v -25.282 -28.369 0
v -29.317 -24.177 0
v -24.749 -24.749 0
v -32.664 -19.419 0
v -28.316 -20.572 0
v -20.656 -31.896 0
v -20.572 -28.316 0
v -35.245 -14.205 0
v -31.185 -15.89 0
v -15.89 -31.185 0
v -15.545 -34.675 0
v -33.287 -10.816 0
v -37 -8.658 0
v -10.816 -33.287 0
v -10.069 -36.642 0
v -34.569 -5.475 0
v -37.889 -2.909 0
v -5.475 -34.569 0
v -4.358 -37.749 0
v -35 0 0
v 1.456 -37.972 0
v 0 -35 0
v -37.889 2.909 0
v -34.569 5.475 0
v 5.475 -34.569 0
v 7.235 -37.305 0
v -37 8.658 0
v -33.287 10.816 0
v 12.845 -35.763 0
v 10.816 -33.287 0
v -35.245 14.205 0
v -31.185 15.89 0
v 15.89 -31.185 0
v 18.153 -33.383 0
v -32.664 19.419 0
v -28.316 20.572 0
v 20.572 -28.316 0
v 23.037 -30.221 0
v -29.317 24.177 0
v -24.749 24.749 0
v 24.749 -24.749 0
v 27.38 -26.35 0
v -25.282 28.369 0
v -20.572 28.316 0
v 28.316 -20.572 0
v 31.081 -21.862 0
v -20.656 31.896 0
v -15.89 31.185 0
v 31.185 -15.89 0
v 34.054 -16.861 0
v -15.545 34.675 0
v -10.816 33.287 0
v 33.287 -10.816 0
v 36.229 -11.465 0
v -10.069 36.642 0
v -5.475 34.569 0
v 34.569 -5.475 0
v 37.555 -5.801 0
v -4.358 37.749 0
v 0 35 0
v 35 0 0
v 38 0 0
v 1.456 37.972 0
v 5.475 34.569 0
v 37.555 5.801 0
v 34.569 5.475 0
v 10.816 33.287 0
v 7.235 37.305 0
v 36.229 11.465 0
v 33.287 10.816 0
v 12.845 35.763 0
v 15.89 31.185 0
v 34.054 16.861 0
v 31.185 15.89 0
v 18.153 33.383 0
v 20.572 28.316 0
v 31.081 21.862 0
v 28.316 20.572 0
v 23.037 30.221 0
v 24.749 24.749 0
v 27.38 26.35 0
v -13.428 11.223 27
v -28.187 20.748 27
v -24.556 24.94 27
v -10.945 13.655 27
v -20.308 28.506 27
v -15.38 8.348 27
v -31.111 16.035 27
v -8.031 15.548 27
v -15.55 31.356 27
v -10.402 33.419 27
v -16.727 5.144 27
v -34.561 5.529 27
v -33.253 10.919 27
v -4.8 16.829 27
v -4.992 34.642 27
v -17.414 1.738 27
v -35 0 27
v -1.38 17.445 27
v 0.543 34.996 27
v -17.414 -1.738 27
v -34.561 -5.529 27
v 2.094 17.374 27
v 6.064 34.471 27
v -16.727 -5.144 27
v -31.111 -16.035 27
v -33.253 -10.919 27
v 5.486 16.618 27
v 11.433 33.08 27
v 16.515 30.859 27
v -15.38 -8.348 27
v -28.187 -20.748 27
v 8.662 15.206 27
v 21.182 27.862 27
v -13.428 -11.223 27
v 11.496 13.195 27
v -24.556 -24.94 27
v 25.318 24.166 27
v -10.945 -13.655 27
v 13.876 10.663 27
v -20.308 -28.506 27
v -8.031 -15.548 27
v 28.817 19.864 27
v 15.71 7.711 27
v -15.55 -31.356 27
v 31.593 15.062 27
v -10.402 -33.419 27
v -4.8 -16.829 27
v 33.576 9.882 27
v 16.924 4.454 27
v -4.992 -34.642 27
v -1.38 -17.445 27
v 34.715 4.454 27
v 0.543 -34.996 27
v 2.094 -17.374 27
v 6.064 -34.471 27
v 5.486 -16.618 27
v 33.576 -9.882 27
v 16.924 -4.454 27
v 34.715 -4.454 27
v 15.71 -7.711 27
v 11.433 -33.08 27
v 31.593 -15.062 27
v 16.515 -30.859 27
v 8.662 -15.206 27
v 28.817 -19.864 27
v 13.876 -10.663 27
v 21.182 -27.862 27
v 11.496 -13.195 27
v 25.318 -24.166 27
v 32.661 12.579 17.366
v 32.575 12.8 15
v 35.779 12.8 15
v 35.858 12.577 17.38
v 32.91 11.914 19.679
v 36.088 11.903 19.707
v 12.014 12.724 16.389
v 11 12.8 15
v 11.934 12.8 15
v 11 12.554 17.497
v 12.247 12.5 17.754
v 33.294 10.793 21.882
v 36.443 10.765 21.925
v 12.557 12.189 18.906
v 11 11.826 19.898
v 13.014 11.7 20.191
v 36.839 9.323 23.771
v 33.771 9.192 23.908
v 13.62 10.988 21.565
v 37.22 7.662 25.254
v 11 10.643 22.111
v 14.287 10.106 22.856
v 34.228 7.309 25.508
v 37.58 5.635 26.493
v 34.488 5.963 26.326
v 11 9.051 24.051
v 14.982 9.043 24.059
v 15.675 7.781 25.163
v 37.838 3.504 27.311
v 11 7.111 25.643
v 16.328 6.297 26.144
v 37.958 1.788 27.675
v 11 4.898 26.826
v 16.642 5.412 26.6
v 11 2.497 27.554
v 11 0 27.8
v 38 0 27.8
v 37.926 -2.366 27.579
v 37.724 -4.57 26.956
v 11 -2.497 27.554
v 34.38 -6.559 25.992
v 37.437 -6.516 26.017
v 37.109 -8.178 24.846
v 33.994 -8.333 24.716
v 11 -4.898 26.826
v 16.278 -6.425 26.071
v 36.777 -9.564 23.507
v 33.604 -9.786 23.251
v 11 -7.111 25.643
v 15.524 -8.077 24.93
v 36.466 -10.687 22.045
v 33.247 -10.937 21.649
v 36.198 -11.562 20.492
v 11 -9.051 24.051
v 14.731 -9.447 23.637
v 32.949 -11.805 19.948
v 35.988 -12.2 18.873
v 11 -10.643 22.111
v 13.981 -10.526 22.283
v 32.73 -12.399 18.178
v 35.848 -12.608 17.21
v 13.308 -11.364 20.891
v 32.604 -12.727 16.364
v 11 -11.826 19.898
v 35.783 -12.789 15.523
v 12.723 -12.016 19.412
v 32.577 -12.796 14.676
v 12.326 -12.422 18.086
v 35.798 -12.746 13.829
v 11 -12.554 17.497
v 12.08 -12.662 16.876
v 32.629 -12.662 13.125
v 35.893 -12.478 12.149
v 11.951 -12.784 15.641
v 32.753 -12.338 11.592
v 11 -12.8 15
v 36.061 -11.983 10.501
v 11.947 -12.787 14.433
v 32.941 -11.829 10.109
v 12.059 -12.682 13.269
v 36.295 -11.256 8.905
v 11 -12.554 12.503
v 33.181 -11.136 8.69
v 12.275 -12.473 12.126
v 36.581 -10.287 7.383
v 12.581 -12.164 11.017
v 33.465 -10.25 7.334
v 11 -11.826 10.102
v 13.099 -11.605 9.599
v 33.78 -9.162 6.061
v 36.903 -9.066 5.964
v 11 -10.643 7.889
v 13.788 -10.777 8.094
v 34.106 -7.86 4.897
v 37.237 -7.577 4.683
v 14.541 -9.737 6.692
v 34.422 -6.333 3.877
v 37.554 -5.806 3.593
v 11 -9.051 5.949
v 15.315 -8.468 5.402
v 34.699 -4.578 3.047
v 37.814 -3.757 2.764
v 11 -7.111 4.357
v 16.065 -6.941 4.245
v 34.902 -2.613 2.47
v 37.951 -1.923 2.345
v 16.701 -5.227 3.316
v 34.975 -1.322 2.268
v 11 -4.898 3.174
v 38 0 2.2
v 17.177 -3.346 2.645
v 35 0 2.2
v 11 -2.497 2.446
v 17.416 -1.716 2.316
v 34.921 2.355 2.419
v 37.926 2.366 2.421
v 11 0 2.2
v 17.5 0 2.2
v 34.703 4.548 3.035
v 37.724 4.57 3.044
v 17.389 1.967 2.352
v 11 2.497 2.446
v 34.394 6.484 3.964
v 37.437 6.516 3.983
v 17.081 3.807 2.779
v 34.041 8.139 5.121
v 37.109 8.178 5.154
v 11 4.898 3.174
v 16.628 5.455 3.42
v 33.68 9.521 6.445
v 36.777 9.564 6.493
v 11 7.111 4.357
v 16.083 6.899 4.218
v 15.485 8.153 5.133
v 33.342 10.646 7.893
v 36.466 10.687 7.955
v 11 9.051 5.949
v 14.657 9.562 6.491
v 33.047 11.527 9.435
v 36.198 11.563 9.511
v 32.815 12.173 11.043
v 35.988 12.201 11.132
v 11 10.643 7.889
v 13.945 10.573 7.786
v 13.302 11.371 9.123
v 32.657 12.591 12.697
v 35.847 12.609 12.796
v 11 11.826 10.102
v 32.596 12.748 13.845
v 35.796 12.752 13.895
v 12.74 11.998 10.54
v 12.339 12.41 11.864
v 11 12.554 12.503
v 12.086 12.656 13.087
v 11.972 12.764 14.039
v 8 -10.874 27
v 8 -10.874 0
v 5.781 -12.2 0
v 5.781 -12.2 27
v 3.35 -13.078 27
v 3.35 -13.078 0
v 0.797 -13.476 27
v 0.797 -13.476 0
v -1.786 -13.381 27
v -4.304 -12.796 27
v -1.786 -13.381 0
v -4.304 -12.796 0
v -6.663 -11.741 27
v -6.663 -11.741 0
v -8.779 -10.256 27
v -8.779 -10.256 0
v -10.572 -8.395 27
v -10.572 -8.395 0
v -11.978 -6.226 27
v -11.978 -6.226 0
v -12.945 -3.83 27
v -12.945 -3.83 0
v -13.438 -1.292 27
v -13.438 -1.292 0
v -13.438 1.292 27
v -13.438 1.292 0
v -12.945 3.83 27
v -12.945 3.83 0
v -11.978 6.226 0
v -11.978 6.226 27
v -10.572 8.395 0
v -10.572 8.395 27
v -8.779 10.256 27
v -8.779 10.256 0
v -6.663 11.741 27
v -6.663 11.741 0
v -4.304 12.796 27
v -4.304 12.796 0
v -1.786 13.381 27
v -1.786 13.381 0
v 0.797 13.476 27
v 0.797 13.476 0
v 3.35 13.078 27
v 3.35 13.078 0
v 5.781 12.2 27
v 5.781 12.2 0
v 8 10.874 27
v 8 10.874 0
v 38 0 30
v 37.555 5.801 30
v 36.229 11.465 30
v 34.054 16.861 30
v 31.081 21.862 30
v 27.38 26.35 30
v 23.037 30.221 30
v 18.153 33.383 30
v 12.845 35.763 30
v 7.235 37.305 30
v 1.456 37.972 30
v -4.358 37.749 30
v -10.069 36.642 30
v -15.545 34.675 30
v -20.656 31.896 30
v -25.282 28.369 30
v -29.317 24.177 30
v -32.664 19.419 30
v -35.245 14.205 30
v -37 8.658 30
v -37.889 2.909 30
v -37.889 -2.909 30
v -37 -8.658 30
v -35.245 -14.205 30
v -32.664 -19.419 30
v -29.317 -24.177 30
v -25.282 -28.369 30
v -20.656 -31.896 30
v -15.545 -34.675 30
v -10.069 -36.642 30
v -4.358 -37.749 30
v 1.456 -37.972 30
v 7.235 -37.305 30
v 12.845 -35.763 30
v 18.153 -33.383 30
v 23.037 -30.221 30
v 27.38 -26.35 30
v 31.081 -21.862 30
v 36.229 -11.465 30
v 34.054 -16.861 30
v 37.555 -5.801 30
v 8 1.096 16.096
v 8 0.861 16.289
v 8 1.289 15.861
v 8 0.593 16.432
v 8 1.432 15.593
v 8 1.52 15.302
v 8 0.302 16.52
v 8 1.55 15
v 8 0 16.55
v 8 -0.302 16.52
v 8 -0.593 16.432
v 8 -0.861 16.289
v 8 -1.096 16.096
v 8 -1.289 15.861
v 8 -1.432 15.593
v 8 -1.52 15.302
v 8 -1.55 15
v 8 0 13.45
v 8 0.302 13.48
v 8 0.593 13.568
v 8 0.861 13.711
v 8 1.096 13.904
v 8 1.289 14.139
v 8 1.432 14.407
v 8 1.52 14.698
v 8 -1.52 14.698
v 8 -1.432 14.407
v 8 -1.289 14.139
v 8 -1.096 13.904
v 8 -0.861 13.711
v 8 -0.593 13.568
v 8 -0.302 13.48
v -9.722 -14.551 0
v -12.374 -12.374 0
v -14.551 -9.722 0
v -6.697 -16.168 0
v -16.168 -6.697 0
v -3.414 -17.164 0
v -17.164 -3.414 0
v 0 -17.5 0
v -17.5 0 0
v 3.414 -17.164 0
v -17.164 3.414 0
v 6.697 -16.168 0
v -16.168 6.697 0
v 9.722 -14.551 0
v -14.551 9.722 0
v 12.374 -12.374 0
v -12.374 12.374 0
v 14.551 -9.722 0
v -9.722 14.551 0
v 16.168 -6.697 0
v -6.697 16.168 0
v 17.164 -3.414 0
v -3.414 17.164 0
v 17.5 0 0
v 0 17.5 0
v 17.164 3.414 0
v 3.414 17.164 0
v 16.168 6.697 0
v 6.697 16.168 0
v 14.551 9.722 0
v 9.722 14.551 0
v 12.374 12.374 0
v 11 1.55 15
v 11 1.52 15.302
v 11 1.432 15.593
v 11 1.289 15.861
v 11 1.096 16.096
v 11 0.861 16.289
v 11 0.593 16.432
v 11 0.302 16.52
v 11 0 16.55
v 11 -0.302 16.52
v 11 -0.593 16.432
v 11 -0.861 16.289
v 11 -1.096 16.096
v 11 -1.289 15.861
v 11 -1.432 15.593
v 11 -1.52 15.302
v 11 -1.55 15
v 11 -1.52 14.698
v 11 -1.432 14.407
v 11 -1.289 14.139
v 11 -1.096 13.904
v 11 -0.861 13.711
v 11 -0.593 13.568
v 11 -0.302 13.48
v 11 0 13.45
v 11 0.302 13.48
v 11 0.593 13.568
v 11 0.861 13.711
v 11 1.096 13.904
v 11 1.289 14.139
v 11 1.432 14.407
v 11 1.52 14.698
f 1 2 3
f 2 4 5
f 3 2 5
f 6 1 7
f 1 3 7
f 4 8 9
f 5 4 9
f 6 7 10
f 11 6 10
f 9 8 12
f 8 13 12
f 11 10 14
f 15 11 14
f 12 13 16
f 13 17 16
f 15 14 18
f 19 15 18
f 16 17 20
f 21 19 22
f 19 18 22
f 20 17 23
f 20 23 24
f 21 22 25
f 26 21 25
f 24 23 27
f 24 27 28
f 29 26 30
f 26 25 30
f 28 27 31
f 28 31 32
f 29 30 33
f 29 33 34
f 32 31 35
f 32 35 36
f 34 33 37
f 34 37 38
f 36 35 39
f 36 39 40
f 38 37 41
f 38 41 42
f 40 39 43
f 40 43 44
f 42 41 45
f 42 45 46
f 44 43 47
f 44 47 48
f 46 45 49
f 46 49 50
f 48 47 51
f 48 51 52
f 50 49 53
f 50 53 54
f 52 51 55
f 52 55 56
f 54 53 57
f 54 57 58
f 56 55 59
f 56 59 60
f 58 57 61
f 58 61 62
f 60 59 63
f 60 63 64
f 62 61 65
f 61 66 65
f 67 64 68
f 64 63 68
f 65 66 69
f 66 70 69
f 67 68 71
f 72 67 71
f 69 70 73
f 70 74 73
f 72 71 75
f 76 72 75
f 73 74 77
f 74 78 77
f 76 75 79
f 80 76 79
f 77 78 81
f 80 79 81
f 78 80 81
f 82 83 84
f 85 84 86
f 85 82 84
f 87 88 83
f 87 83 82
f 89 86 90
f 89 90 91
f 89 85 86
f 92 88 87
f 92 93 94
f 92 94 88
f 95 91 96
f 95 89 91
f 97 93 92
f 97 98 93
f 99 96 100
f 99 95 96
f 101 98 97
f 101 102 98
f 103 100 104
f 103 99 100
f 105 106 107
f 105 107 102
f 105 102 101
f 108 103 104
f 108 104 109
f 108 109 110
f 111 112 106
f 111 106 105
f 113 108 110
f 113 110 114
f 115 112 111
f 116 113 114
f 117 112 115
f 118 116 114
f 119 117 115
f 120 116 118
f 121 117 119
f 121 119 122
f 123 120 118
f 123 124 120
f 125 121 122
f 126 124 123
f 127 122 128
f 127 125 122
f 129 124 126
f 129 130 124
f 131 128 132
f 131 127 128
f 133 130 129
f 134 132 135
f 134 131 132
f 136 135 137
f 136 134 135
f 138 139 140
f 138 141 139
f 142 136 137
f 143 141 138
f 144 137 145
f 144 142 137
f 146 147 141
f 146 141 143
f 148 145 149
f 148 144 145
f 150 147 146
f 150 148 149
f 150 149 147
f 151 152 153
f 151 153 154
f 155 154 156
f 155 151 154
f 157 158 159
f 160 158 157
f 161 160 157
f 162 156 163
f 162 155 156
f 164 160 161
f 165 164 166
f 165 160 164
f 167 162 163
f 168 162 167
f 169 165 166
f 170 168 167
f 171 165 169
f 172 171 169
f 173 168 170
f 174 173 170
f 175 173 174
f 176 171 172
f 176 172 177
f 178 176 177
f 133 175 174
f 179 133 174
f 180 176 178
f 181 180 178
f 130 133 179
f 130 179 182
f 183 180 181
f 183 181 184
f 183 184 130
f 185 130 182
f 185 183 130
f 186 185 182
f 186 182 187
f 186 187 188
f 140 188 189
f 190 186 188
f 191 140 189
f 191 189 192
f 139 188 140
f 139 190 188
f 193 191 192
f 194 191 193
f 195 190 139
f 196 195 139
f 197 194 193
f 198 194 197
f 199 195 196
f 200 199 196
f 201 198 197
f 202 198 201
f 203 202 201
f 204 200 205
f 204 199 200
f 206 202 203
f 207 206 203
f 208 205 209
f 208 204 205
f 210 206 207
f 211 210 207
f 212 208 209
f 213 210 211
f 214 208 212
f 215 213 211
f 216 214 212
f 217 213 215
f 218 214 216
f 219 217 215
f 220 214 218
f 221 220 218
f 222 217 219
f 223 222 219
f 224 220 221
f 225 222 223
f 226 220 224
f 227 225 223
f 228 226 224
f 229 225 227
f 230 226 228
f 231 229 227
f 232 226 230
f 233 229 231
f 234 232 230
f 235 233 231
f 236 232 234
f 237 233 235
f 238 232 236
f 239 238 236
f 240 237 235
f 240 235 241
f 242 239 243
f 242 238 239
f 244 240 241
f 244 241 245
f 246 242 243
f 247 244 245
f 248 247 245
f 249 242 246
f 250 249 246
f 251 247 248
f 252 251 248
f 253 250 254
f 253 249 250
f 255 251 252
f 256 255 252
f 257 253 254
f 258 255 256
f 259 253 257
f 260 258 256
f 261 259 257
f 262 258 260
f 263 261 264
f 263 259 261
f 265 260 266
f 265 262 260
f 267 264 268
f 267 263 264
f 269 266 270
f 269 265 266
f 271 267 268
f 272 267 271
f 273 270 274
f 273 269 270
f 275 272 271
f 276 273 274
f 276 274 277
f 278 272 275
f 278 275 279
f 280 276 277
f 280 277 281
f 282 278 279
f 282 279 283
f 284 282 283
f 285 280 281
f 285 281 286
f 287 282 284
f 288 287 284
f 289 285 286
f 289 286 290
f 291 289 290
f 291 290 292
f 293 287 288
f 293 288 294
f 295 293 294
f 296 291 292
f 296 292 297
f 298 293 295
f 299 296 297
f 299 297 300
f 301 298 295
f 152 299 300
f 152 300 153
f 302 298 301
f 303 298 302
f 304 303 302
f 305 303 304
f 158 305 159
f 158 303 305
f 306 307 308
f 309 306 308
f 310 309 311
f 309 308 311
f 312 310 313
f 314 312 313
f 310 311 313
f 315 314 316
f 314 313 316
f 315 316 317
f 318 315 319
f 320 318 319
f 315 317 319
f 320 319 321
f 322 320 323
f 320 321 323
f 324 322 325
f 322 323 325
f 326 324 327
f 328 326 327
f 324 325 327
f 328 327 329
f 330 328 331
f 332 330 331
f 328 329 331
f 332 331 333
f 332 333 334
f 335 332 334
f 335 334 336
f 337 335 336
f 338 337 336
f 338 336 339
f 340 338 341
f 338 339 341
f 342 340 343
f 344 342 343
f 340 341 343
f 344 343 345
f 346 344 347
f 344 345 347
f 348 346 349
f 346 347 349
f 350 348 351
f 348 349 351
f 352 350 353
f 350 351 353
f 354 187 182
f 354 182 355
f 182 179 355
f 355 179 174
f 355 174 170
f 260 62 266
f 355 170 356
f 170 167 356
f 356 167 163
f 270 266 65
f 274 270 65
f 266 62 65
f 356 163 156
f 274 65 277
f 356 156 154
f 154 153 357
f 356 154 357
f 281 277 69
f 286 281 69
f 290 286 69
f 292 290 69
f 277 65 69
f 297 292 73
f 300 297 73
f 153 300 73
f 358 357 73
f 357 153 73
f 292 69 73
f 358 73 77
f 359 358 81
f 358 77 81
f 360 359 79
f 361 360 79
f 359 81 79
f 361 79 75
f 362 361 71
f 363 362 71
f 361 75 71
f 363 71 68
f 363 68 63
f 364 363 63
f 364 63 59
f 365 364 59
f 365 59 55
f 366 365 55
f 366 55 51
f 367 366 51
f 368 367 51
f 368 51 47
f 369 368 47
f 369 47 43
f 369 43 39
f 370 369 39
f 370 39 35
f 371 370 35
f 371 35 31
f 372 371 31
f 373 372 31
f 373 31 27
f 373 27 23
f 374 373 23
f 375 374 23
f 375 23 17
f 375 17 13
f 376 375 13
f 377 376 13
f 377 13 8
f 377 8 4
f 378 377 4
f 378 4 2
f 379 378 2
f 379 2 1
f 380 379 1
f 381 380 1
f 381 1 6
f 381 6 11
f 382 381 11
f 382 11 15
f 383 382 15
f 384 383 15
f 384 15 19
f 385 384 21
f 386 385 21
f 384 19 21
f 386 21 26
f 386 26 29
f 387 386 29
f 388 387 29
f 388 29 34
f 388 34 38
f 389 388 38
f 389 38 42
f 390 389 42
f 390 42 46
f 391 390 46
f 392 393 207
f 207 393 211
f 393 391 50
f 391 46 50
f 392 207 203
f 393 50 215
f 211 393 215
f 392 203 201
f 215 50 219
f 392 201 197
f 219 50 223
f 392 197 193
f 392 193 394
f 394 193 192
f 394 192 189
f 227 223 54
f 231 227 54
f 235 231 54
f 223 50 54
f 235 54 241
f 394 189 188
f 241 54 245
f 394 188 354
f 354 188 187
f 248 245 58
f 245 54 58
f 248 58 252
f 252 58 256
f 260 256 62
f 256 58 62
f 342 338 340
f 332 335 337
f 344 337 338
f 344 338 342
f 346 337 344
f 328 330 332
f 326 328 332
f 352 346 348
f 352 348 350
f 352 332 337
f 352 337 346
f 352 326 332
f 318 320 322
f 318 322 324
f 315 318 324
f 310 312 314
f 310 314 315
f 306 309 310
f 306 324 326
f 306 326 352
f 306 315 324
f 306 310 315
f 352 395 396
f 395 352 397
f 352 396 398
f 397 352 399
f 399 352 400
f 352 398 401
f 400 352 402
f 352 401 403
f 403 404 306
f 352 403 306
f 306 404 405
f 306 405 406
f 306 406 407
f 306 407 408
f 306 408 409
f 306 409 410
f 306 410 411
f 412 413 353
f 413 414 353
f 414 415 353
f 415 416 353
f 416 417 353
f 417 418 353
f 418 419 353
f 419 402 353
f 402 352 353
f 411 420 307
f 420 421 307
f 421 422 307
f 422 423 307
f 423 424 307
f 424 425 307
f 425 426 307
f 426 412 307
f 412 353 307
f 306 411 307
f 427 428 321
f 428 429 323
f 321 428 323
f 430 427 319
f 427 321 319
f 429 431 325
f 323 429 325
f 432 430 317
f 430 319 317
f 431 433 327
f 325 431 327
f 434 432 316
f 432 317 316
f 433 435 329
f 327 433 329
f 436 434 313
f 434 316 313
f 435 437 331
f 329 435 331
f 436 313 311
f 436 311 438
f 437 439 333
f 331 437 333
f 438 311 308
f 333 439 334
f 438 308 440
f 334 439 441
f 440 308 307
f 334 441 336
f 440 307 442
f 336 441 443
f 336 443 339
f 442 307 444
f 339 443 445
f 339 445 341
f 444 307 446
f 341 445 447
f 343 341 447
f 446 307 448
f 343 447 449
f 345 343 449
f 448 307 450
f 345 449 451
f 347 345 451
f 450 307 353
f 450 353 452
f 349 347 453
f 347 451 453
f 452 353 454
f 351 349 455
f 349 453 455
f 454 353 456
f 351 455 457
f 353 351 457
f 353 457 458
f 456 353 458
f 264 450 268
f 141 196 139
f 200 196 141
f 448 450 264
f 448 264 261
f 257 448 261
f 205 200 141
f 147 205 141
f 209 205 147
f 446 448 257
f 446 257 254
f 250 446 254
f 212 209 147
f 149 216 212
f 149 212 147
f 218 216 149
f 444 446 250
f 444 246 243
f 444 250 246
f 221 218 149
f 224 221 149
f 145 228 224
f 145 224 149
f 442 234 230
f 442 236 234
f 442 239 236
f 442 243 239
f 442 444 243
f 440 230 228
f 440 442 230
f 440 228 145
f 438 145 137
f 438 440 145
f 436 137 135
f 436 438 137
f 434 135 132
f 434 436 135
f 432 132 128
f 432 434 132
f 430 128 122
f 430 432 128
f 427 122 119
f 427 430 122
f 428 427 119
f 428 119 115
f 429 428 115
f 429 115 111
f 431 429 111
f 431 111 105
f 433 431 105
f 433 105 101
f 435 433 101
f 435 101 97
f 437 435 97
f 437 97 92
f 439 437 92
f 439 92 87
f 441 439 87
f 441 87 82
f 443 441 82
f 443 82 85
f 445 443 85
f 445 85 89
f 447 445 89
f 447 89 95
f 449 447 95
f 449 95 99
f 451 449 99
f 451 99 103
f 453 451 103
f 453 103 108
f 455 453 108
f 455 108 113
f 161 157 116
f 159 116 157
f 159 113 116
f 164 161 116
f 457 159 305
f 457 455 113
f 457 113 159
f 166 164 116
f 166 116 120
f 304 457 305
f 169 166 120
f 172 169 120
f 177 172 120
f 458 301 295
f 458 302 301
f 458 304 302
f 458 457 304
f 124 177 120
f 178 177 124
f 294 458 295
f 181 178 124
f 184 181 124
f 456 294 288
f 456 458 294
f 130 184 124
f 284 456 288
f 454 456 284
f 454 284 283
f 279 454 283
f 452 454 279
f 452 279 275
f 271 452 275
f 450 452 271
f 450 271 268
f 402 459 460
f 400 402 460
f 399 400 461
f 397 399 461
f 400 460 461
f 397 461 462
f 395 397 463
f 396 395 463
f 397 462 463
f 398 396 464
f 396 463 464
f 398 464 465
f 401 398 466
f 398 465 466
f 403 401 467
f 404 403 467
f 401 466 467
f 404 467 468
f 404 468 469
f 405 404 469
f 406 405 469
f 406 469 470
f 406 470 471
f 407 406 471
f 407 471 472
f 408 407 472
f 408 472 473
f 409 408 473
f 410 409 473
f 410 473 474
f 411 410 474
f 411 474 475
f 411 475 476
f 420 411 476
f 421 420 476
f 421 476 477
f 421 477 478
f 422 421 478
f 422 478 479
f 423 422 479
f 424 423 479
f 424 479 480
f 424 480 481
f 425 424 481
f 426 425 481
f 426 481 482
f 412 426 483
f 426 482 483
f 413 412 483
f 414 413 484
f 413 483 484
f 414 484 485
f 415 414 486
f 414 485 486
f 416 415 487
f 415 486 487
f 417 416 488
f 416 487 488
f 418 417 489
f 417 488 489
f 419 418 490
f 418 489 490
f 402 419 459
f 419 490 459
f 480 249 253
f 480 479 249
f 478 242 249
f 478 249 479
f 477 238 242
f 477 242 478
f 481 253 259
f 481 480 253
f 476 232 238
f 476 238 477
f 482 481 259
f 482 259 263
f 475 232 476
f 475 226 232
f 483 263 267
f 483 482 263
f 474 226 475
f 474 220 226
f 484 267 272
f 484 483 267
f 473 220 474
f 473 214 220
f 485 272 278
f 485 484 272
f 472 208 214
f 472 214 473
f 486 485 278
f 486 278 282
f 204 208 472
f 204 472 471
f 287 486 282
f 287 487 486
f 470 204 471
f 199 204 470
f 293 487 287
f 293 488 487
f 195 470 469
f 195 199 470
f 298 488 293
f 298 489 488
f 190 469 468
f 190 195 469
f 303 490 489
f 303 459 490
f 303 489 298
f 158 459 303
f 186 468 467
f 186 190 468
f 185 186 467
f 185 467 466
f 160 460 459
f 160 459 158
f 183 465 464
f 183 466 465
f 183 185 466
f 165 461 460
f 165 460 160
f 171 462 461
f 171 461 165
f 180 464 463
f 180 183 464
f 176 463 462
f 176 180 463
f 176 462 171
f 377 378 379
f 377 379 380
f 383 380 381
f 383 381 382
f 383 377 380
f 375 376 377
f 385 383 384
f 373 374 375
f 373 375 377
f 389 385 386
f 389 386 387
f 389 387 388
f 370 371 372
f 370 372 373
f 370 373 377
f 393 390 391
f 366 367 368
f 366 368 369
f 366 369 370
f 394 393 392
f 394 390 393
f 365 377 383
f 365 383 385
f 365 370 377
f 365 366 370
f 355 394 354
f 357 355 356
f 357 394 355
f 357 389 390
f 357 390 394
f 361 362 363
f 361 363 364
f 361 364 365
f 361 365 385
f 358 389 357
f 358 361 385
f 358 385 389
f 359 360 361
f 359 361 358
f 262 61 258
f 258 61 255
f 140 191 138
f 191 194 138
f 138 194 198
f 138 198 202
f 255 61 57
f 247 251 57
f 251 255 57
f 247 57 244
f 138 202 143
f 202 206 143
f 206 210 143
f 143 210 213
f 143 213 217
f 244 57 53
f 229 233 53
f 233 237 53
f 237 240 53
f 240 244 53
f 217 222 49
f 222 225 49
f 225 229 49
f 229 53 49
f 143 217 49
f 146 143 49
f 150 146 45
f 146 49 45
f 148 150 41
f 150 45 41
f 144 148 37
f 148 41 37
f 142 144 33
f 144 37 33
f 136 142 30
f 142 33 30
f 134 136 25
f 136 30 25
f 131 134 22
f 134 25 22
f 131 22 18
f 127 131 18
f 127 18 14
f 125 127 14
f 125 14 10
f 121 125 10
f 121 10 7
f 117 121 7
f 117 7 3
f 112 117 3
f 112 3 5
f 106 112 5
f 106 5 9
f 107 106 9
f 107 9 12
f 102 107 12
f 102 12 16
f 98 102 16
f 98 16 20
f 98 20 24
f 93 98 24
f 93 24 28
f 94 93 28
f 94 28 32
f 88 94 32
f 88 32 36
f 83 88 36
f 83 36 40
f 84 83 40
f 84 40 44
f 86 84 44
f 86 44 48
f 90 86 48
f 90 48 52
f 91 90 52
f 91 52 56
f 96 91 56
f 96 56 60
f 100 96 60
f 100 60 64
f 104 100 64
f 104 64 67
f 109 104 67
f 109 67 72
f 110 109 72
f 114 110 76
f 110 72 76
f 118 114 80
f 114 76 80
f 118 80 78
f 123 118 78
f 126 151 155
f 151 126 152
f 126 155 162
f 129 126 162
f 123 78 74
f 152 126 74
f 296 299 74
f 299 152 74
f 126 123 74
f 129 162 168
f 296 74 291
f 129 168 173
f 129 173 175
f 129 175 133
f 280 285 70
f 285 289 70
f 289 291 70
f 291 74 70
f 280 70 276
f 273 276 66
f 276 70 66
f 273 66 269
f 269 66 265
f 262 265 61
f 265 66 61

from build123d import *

# Parameters (mm, degrees)
F0_R     = 38
F1_DEPTH = 30
F2_R     = 35
F2_R_2   = 17.5
F3_DEPTH = 27
F5_START = 11
F4_R     = 12.8
F5_DEPTH = 35
F7_DEPTH = 27
F8_R     = 1.55
F9_DEPTH = 5


with BuildPart() as f1:
    # F0 (on Top) → F1 (new body)
    with BuildSketch(Plane.XY):
        Circle(F0_R)
    extrude(amount=F1_DEPTH)

    # F2 (on face) → F3 (cut)
    with BuildSketch(Plane(origin=(0, 0, 0), x_dir=(1, 0, 0), z_dir=(0, 0, -1))):
        Circle(F2_R)
        Circle(F2_R_2, mode=Mode.SUBTRACT)
    extrude(amount=-F3_DEPTH, mode=Mode.SUBTRACT)

    # F4 (on Right) → F5 (cut)
    with BuildSketch(Plane.YZ.offset(F5_START)):
        with Locations((0, 15)):
            Circle(F4_R)
    extrude(amount=F5_DEPTH, mode=Mode.SUBTRACT)

    # F6 (on face) → F7 (cut)
    with BuildSketch(Plane(origin=(0, 0, 0), x_dir=(1, 0, 0), z_dir=(0, 0, -1))):
        with BuildLine():
            Line((8, -10.8742815855), (8, 10.8742815855))
            ThreePointArc((8, 10.8742815855), (-13.5, 0), (8, -10.8742815855))
        make_face()
    extrude(amount=-F7_DEPTH, mode=Mode.SUBTRACT)

    # F8 (on face) → F9 (cut)
    with BuildSketch(Plane.YZ.offset(11)):
        with Locations((0, 15)):
            Circle(F8_R)
    extrude(amount=-F9_DEPTH, mode=Mode.SUBTRACT)


solid = f1.part
